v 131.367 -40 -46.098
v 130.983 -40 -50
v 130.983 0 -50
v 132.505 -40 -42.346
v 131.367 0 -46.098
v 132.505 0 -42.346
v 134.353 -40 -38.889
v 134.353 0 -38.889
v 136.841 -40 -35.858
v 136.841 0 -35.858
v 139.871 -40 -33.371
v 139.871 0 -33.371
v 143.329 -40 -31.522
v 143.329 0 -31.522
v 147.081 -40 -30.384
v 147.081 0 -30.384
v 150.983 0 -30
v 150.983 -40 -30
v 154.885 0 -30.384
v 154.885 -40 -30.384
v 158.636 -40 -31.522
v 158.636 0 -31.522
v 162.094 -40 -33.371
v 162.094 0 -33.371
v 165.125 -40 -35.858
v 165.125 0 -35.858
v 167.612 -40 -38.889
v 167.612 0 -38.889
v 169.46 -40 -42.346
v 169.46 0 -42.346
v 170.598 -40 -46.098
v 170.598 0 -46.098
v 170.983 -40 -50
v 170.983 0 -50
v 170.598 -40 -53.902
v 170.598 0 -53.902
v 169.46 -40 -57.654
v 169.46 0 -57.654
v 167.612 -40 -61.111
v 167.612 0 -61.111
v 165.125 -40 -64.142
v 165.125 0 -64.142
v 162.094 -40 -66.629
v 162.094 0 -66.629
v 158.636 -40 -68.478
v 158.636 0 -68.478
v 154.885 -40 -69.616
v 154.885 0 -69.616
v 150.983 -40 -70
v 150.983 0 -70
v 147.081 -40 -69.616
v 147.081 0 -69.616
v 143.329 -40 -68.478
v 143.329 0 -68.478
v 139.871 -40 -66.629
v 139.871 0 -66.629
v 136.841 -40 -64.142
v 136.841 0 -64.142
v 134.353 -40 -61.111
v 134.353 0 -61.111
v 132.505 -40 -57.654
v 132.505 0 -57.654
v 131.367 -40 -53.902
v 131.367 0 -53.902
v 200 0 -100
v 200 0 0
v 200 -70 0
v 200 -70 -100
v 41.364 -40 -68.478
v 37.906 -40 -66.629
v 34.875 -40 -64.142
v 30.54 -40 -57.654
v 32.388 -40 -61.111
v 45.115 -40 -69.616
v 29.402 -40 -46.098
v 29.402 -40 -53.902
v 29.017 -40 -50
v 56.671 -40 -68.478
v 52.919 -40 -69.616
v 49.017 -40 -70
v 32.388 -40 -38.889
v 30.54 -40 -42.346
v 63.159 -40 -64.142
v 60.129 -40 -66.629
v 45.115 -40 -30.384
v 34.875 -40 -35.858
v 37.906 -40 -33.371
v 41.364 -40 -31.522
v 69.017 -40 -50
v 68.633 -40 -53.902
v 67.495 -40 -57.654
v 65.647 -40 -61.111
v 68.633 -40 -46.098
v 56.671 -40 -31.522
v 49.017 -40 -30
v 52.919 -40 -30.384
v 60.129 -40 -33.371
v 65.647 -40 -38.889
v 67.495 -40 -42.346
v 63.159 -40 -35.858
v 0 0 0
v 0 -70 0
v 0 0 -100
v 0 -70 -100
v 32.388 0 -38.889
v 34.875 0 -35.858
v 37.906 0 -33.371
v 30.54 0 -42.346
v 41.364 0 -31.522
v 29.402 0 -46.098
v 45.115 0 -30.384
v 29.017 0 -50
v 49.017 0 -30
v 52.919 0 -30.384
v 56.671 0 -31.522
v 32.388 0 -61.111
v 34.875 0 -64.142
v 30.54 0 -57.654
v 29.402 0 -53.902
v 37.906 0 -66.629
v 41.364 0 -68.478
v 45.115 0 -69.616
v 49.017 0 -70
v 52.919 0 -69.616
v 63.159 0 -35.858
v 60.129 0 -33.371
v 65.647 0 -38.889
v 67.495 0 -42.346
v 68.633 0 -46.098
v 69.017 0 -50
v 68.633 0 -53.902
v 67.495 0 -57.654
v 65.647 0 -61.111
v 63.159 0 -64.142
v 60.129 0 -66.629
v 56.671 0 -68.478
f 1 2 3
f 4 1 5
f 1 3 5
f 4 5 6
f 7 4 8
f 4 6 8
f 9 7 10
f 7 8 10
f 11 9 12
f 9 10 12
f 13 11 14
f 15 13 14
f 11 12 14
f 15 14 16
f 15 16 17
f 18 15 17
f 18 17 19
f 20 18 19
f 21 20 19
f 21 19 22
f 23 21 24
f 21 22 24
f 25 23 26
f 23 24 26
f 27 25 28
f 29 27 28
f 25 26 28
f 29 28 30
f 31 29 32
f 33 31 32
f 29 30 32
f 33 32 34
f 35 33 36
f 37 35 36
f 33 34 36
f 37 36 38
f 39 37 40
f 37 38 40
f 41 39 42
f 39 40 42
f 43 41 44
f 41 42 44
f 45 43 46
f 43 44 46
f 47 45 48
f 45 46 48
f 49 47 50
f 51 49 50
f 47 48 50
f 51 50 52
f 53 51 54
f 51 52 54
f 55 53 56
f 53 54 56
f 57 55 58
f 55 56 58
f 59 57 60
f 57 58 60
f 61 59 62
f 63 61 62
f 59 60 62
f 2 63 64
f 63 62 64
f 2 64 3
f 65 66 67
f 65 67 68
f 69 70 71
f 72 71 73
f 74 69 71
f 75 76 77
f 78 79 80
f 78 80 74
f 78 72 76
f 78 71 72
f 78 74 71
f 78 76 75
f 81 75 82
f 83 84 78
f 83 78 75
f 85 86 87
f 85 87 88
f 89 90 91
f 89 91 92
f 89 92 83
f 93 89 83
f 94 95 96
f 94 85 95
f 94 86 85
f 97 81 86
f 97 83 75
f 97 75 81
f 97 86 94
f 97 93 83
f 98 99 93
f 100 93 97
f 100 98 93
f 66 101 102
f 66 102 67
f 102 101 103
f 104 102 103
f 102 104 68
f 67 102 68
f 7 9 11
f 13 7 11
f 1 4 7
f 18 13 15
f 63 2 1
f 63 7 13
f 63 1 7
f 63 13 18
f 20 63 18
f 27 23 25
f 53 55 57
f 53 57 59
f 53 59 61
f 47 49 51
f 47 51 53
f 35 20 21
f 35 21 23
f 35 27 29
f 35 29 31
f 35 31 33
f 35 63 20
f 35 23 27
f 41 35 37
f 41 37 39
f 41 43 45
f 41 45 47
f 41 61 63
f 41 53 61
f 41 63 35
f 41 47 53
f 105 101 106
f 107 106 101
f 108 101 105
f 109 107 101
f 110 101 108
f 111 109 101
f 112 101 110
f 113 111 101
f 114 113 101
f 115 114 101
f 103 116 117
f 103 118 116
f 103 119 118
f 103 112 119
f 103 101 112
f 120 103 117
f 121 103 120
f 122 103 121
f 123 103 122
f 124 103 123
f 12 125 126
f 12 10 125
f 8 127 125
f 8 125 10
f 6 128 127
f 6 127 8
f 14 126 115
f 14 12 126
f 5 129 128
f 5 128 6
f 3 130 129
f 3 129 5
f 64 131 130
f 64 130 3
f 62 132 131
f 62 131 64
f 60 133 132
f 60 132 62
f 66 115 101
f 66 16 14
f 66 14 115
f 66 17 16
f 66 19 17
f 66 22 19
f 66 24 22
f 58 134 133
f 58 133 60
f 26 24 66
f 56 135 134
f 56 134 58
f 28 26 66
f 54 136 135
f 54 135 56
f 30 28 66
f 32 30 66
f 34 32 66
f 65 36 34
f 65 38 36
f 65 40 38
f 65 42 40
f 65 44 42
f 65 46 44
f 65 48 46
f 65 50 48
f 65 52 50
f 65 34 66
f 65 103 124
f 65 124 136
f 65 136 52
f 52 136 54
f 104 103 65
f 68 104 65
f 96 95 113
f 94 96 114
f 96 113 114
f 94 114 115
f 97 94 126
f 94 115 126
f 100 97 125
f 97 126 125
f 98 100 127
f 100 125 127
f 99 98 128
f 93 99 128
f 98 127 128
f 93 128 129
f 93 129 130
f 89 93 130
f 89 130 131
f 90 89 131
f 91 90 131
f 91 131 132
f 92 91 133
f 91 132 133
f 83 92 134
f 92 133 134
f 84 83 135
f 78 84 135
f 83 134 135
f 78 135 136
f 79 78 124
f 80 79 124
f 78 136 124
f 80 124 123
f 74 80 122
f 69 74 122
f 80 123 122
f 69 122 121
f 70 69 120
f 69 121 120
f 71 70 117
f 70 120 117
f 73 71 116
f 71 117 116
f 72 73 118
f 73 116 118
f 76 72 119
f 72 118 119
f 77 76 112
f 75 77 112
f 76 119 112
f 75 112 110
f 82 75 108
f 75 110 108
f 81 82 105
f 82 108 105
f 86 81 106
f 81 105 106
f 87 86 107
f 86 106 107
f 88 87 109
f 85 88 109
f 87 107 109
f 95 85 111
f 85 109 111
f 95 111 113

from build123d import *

# Parameters (mm, degrees)
SKETCH_1_W          = 200
SKETCH_1_H          = 100
EXTRUDE_1_DEPTH     = 70
SKETCH_3_R          = 20
CUT_EXTRUDE_1_DEPTH = 40
SKETCH_3_3_R        = 20
CUT_EXTRUDE_2_DEPTH = 40


with BuildPart() as part:
    # Эскиз1 → Бобышка-Вытянуть1 (new body)
    with BuildSketch(Plane(origin=(0, 0, 0), x_dir=(1, 0, 0), z_dir=(0, 1, 0))):
        with Locations((100, 50)):
            Rectangle(SKETCH_1_W, SKETCH_1_H)
    extrude(amount=-EXTRUDE_1_DEPTH)

    # Эскиз3 → Вырез-Вытянуть1 (cut)
    with BuildSketch(Plane(origin=(0, 0, 0), x_dir=(1, 0, 0), z_dir=(0, 1, 0))):
        with Locations((49.017273864, 50)):
            Circle(SKETCH_3_R)
    extrude(amount=-CUT_EXTRUDE_1_DEPTH, mode=Mode.SUBTRACT)

    # Эскиз3<3> → Вырез-Вытянуть2 (cut)
    with BuildSketch(Plane(origin=(0, 0, 0), x_dir=(1, 0, 0), z_dir=(0, 1, 0))):
        with Locations((150.982726136, 50)):
            Circle(SKETCH_3_3_R)
    extrude(amount=-CUT_EXTRUDE_2_DEPTH, mode=Mode.SUBTRACT)


solid = part.part
